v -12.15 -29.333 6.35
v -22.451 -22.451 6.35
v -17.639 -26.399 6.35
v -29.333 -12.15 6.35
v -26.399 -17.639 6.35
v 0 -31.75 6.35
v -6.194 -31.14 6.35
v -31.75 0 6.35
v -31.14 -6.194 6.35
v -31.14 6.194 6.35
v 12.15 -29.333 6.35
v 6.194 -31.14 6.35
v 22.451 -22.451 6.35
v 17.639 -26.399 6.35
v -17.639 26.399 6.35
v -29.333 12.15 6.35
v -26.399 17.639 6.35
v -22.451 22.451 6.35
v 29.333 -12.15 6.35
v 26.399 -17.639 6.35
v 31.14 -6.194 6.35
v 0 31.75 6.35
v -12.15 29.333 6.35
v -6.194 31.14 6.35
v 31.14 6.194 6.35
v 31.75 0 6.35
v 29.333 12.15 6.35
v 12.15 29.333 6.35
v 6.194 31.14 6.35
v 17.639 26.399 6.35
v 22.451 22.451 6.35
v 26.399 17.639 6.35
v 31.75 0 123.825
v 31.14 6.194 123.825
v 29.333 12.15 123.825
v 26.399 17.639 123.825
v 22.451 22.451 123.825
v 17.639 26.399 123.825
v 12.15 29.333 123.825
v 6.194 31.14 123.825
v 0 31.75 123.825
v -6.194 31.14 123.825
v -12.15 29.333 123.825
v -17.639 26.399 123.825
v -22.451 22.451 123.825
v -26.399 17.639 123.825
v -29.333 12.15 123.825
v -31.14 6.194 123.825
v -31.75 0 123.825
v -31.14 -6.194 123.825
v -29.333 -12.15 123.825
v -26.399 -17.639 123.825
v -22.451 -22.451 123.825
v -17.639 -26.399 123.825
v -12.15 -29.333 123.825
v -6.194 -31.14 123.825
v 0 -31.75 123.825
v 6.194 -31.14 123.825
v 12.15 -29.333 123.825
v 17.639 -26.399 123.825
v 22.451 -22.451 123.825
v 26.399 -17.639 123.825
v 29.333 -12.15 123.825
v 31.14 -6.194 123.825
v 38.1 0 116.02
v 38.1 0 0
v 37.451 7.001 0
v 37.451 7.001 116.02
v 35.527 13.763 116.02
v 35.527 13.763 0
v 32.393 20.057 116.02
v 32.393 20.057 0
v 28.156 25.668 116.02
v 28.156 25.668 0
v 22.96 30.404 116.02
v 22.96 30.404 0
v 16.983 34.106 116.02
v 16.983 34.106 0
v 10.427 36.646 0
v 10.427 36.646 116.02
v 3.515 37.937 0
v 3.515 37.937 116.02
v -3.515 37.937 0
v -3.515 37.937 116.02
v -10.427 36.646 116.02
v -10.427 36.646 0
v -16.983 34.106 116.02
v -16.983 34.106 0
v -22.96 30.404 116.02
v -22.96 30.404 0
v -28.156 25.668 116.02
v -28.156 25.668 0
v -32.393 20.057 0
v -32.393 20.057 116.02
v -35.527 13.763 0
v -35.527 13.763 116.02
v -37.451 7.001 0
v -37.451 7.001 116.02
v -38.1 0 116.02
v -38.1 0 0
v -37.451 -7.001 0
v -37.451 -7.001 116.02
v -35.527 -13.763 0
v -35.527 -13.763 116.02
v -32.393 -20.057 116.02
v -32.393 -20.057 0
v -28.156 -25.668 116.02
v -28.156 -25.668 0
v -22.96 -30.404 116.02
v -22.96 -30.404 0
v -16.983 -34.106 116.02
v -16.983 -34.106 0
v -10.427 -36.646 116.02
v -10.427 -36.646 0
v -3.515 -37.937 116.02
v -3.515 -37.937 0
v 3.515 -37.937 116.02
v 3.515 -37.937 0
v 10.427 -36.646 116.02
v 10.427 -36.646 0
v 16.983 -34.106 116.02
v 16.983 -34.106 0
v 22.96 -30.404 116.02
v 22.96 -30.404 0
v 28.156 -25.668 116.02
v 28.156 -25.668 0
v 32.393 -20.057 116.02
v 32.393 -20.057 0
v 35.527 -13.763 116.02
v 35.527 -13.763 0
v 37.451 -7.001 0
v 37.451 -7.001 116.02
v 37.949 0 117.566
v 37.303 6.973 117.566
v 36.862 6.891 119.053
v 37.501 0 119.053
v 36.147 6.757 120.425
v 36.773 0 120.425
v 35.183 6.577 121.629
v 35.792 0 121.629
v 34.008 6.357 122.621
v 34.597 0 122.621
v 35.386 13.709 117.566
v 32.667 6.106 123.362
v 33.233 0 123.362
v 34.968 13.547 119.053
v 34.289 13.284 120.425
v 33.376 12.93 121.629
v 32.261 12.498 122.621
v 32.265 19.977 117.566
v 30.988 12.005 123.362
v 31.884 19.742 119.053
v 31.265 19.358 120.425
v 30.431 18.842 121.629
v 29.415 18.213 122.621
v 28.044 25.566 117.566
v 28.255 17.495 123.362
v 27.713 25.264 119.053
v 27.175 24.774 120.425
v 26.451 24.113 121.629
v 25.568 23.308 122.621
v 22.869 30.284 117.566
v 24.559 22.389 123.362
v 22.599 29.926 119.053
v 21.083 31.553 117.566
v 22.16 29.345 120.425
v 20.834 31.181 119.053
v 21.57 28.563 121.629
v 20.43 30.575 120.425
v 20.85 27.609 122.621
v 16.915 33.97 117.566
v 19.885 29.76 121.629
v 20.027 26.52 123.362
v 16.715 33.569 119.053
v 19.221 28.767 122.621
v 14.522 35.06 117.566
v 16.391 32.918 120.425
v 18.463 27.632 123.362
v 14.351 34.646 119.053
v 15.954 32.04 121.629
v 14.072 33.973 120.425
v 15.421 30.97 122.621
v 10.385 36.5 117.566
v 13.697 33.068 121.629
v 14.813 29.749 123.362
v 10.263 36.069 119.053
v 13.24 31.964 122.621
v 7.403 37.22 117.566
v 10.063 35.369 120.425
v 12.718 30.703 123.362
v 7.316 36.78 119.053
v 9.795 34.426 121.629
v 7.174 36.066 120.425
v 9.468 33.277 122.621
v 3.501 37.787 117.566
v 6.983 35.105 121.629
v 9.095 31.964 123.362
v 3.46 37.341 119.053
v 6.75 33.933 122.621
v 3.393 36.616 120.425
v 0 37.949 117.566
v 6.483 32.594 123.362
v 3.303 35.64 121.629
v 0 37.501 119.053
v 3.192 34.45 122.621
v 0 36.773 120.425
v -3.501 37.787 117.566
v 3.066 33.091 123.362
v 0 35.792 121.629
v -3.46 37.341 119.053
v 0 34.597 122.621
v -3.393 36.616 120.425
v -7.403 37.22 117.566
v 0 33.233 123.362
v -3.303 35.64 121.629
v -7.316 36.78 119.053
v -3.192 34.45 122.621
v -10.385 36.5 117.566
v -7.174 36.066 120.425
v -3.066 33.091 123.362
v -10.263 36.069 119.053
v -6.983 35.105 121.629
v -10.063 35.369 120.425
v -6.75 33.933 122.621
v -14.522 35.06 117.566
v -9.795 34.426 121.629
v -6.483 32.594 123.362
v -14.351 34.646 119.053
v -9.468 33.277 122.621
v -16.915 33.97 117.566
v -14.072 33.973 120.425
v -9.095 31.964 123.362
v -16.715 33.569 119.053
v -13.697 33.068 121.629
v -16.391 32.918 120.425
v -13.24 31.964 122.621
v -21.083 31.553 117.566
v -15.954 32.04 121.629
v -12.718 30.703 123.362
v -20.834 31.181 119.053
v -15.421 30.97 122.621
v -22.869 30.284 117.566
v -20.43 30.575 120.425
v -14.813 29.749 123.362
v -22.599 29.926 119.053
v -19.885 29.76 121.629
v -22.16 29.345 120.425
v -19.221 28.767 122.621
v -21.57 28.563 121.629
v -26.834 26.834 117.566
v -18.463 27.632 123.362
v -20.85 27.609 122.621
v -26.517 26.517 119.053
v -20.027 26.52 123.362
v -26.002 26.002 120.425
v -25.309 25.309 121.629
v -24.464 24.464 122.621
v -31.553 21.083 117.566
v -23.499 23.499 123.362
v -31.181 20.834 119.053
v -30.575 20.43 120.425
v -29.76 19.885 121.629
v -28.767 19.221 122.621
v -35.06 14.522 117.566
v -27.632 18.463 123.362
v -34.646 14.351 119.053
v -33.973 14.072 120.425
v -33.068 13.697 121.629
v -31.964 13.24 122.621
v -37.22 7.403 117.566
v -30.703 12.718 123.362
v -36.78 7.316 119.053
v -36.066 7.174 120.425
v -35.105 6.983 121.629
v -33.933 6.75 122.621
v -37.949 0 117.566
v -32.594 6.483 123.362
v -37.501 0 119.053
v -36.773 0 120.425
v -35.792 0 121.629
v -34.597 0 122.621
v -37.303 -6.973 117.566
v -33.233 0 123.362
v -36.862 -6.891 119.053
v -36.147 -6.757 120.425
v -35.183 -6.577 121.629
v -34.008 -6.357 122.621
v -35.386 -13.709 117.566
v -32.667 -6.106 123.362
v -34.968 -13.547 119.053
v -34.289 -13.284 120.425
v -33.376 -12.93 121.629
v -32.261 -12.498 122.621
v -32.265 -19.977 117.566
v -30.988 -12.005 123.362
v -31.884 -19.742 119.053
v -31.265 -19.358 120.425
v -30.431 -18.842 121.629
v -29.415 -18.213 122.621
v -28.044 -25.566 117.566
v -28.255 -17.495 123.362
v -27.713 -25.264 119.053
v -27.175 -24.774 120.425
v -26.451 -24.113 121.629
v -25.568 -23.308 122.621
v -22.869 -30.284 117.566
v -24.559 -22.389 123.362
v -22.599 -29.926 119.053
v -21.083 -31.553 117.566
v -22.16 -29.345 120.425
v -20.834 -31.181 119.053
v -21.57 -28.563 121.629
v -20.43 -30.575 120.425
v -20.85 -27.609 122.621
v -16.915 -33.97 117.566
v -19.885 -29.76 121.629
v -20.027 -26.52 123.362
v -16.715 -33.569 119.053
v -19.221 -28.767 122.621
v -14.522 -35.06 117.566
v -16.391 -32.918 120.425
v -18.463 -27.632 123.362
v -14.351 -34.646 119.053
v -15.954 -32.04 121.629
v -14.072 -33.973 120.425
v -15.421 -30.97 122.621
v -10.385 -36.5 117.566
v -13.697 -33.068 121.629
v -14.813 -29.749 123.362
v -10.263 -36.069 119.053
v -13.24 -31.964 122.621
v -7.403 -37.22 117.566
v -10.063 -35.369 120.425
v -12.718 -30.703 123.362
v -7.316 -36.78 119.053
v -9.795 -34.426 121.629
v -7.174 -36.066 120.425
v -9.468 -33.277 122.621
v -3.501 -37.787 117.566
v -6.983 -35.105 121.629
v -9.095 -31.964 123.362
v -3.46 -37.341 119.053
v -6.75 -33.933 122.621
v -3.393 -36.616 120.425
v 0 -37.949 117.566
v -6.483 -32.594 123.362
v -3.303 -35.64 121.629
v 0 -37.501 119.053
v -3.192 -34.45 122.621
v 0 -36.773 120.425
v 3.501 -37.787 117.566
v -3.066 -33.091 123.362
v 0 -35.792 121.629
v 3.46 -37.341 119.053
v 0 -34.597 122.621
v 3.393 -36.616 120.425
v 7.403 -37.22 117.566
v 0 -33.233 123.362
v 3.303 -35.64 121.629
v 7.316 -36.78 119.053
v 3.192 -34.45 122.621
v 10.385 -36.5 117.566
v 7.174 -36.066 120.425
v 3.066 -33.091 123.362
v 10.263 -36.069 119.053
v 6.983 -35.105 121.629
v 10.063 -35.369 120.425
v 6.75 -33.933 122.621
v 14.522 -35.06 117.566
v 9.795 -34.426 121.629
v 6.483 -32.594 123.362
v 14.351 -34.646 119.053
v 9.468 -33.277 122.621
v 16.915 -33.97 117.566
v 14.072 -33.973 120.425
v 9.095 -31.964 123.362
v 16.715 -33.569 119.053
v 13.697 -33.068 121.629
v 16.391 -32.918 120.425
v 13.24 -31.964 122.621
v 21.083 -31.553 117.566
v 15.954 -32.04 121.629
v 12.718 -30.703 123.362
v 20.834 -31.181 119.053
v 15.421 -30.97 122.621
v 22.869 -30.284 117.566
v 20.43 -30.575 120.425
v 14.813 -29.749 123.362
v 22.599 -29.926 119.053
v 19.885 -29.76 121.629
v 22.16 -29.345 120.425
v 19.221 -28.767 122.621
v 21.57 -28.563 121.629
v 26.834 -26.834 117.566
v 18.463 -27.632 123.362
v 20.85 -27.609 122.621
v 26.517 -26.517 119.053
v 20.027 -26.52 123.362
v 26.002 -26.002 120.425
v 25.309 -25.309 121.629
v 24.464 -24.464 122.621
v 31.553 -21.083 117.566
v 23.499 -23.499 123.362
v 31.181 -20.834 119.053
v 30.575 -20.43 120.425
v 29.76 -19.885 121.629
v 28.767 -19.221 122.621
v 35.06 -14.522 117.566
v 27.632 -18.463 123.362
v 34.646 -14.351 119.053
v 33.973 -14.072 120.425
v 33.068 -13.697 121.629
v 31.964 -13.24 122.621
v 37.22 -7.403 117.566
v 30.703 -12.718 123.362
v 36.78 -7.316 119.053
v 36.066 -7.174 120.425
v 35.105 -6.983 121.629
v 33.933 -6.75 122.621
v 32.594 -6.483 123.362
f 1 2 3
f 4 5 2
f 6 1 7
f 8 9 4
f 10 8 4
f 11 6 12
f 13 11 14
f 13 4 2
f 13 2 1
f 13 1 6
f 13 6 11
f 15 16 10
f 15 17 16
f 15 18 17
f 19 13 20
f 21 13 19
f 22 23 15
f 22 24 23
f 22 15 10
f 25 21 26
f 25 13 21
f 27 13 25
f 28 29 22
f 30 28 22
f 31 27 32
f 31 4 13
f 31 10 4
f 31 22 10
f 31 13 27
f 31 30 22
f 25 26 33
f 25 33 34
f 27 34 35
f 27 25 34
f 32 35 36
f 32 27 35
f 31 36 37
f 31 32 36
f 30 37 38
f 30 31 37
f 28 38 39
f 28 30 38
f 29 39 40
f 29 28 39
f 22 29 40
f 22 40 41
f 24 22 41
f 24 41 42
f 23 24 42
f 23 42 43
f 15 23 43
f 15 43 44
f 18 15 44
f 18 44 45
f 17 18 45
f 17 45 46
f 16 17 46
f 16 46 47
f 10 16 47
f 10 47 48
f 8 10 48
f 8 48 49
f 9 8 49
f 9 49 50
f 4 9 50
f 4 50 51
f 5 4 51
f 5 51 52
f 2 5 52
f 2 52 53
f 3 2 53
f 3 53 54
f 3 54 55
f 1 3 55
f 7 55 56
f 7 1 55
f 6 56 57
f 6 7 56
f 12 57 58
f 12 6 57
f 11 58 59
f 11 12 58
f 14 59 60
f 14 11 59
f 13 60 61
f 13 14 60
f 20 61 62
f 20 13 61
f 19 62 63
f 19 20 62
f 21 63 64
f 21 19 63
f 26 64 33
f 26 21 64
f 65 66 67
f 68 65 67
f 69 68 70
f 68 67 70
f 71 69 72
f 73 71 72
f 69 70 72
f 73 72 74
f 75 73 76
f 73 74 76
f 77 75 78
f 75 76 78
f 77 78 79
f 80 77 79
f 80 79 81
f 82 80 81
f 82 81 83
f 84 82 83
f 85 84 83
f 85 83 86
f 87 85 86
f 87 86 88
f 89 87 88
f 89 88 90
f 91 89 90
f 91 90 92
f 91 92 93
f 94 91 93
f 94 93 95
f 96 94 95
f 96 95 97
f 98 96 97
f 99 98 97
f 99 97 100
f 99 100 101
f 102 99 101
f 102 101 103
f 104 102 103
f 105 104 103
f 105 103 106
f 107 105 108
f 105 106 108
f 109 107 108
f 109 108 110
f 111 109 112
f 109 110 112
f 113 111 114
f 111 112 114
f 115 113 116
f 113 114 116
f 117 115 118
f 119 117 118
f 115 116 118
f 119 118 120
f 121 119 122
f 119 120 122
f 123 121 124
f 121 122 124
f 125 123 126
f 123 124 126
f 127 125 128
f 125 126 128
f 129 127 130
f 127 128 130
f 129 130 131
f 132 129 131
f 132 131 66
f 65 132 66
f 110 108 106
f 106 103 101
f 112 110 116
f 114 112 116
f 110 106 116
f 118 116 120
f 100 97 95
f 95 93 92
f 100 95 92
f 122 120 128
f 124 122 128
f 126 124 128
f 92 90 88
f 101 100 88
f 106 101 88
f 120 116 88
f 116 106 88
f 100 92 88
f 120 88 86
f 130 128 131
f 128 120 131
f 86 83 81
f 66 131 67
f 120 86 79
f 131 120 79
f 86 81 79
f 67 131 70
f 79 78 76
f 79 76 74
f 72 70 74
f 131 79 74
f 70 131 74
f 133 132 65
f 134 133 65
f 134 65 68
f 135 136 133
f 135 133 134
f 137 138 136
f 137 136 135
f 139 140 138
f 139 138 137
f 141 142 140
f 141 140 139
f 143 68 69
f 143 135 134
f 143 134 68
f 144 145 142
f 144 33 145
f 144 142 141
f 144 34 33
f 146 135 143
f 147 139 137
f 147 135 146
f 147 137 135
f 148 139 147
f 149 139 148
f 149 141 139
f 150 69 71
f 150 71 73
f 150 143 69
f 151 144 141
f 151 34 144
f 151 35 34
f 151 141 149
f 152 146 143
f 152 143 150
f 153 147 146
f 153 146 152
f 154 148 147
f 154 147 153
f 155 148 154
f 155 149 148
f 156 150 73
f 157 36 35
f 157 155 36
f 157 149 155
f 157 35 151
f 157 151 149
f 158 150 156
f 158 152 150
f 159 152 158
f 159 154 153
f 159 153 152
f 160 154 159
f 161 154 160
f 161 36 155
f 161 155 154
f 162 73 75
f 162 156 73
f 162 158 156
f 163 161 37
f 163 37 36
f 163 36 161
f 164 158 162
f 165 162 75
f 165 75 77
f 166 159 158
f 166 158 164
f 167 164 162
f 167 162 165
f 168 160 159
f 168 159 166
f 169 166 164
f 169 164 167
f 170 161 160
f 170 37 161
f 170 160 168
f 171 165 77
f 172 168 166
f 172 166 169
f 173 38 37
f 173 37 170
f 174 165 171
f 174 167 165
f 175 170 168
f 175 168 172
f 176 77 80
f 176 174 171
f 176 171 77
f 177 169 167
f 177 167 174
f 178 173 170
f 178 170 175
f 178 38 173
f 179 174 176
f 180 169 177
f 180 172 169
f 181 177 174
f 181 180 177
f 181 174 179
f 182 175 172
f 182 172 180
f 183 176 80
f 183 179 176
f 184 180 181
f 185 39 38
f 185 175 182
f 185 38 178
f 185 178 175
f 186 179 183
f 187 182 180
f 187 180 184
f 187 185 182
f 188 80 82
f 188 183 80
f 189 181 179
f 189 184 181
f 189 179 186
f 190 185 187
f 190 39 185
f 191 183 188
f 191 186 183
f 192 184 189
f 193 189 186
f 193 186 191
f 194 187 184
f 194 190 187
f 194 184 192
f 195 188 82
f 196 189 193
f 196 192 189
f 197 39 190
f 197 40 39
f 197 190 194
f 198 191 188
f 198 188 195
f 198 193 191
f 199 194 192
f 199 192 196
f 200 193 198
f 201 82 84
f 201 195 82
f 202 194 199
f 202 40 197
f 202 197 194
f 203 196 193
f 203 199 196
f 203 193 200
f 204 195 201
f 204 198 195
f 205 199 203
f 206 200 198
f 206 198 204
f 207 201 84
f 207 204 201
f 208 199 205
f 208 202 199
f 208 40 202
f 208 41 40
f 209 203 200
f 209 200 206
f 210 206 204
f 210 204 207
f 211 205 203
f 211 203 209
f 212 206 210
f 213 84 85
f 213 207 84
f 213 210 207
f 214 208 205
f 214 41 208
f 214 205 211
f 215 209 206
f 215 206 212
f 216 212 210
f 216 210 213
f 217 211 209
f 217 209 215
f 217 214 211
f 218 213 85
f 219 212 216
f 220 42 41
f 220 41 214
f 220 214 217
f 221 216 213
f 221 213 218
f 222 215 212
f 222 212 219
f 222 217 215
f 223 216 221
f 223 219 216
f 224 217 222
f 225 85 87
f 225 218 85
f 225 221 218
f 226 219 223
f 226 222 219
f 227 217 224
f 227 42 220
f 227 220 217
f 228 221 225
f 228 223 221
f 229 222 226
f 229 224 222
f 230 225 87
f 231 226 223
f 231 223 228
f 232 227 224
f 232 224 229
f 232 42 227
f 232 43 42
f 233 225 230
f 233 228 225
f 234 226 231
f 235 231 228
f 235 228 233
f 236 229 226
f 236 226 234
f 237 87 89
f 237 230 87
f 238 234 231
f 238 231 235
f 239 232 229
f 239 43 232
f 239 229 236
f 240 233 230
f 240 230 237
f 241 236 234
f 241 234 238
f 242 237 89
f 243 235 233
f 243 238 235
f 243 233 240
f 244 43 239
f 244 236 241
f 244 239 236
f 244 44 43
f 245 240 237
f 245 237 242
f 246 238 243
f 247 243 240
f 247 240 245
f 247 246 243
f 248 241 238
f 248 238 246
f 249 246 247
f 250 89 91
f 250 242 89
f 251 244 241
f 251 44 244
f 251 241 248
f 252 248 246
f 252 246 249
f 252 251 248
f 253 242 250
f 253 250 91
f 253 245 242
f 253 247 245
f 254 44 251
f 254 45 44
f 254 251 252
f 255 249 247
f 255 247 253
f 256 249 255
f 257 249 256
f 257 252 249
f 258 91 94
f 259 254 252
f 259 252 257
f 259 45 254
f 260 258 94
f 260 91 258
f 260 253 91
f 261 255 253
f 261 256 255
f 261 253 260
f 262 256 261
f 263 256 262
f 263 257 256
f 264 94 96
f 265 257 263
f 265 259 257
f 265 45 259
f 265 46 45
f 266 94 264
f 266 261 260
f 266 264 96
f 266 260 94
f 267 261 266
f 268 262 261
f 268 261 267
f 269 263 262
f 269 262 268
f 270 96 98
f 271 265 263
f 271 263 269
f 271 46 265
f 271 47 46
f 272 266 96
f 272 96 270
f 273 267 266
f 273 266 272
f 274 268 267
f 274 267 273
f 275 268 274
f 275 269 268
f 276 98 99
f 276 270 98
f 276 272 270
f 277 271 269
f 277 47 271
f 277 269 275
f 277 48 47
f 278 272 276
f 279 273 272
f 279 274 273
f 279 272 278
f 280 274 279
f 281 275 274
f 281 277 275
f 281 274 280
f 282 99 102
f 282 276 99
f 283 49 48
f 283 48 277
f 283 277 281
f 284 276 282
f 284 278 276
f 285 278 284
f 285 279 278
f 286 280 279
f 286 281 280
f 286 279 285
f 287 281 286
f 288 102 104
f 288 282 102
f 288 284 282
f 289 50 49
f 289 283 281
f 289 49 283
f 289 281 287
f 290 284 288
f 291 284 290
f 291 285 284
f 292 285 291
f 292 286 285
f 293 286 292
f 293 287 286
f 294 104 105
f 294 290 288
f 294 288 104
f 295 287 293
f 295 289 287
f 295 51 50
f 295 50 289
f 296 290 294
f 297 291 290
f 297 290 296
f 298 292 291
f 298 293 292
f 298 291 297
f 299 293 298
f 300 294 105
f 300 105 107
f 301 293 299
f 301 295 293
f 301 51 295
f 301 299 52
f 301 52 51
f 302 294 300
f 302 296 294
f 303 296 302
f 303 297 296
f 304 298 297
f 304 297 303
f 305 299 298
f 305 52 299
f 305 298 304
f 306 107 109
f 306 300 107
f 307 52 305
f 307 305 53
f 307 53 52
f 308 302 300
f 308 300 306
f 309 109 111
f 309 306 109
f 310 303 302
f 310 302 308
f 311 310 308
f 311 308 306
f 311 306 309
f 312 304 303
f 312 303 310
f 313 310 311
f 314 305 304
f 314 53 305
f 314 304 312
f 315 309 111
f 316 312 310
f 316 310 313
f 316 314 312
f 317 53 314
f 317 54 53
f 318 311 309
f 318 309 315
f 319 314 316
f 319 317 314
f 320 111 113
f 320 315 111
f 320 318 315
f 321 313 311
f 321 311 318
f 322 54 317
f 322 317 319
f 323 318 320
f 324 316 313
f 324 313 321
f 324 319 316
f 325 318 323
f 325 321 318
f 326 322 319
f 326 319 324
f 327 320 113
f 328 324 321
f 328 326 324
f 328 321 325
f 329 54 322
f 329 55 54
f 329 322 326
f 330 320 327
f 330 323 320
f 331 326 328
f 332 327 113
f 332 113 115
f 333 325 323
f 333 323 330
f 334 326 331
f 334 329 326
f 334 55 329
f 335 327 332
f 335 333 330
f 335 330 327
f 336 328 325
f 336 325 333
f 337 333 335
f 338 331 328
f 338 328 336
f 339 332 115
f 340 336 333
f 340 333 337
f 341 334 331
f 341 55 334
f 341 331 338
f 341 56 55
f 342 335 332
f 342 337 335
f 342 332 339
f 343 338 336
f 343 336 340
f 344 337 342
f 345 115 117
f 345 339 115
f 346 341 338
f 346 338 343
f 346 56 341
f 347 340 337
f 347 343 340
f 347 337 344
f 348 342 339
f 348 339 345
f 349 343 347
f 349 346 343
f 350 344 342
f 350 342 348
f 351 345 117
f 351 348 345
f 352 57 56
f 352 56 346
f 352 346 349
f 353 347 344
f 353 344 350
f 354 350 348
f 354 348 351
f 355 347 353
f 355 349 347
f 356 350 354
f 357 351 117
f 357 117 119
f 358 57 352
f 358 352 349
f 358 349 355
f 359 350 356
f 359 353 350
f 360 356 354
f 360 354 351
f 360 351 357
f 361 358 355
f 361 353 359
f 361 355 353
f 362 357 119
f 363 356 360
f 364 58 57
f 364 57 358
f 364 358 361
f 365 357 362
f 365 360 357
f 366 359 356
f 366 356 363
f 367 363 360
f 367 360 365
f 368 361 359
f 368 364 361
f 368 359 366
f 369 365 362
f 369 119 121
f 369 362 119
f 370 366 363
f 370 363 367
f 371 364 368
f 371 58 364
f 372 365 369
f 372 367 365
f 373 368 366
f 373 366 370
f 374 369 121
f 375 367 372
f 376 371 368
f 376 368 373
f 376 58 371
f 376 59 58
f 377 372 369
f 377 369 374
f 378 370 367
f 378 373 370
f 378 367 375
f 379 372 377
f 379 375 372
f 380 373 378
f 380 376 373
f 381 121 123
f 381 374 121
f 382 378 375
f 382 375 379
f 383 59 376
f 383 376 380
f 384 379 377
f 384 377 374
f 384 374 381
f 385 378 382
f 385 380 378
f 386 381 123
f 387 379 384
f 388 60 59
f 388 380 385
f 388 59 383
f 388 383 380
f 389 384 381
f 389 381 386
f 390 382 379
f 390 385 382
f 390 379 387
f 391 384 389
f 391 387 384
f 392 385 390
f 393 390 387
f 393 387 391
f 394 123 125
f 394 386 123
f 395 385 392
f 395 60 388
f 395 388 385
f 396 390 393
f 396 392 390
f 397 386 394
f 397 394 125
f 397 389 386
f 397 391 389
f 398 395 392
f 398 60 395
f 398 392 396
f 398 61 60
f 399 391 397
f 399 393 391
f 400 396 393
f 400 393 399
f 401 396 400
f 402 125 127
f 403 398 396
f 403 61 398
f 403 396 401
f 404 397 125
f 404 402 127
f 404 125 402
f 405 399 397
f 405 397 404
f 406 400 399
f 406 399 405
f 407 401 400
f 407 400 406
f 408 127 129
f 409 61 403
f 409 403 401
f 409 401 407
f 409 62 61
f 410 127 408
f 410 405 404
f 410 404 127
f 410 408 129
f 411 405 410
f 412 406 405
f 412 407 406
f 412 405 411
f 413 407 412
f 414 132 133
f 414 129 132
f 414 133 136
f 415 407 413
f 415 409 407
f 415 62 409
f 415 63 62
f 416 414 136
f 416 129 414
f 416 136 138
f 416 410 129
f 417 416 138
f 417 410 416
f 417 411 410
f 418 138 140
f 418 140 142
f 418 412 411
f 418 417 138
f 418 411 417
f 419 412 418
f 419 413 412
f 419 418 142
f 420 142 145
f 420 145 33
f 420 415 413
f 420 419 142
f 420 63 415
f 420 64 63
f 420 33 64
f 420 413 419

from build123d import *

# Parameters (mm, degrees)
F0_R     = 38.1
F1_DEPTH = 123.825
F2_T     = -6.35


# Not quite as in the source:
# - a fillet or chamfer that OpenCascade refuses, or shapes differently, is made with other operations: its cross-section is extruded or revolved along the edge and cut away or added


with BuildPart() as f1:
    # F0 (on Top) → F1 (new body)
    with BuildSketch(Plane.XY):
        Circle(F0_R)
    extrude(amount=F1_DEPTH)

    # F2
    f2_openings = [f1.faces().sort_by_distance(p)[0] for p in [
        (0, 0, 123.825),
    ]]
    offset(amount=F2_T, openings=f2_openings)

    # F3: fillet of radius 7.971733183 on 1 edges, made by hand

    # F3_s1 → F3_t2 (revolve, cut)
    with BuildSketch(Plane.XZ):
        with BuildLine():
            ThreePointArc((38.1, 116.019968839), (36.3119774413, 121.0508984605), (31.75, 123.825))
            Line((31.75, 123.825), (38.1, 123.825))
            Line((38.1, 123.825), (38.1, 116.019968839))
        make_face()
    revolve(axis=Axis((0, 0, 123.825), (0, 0, 1)), mode=Mode.SUBTRACT)


solid = f1.part
